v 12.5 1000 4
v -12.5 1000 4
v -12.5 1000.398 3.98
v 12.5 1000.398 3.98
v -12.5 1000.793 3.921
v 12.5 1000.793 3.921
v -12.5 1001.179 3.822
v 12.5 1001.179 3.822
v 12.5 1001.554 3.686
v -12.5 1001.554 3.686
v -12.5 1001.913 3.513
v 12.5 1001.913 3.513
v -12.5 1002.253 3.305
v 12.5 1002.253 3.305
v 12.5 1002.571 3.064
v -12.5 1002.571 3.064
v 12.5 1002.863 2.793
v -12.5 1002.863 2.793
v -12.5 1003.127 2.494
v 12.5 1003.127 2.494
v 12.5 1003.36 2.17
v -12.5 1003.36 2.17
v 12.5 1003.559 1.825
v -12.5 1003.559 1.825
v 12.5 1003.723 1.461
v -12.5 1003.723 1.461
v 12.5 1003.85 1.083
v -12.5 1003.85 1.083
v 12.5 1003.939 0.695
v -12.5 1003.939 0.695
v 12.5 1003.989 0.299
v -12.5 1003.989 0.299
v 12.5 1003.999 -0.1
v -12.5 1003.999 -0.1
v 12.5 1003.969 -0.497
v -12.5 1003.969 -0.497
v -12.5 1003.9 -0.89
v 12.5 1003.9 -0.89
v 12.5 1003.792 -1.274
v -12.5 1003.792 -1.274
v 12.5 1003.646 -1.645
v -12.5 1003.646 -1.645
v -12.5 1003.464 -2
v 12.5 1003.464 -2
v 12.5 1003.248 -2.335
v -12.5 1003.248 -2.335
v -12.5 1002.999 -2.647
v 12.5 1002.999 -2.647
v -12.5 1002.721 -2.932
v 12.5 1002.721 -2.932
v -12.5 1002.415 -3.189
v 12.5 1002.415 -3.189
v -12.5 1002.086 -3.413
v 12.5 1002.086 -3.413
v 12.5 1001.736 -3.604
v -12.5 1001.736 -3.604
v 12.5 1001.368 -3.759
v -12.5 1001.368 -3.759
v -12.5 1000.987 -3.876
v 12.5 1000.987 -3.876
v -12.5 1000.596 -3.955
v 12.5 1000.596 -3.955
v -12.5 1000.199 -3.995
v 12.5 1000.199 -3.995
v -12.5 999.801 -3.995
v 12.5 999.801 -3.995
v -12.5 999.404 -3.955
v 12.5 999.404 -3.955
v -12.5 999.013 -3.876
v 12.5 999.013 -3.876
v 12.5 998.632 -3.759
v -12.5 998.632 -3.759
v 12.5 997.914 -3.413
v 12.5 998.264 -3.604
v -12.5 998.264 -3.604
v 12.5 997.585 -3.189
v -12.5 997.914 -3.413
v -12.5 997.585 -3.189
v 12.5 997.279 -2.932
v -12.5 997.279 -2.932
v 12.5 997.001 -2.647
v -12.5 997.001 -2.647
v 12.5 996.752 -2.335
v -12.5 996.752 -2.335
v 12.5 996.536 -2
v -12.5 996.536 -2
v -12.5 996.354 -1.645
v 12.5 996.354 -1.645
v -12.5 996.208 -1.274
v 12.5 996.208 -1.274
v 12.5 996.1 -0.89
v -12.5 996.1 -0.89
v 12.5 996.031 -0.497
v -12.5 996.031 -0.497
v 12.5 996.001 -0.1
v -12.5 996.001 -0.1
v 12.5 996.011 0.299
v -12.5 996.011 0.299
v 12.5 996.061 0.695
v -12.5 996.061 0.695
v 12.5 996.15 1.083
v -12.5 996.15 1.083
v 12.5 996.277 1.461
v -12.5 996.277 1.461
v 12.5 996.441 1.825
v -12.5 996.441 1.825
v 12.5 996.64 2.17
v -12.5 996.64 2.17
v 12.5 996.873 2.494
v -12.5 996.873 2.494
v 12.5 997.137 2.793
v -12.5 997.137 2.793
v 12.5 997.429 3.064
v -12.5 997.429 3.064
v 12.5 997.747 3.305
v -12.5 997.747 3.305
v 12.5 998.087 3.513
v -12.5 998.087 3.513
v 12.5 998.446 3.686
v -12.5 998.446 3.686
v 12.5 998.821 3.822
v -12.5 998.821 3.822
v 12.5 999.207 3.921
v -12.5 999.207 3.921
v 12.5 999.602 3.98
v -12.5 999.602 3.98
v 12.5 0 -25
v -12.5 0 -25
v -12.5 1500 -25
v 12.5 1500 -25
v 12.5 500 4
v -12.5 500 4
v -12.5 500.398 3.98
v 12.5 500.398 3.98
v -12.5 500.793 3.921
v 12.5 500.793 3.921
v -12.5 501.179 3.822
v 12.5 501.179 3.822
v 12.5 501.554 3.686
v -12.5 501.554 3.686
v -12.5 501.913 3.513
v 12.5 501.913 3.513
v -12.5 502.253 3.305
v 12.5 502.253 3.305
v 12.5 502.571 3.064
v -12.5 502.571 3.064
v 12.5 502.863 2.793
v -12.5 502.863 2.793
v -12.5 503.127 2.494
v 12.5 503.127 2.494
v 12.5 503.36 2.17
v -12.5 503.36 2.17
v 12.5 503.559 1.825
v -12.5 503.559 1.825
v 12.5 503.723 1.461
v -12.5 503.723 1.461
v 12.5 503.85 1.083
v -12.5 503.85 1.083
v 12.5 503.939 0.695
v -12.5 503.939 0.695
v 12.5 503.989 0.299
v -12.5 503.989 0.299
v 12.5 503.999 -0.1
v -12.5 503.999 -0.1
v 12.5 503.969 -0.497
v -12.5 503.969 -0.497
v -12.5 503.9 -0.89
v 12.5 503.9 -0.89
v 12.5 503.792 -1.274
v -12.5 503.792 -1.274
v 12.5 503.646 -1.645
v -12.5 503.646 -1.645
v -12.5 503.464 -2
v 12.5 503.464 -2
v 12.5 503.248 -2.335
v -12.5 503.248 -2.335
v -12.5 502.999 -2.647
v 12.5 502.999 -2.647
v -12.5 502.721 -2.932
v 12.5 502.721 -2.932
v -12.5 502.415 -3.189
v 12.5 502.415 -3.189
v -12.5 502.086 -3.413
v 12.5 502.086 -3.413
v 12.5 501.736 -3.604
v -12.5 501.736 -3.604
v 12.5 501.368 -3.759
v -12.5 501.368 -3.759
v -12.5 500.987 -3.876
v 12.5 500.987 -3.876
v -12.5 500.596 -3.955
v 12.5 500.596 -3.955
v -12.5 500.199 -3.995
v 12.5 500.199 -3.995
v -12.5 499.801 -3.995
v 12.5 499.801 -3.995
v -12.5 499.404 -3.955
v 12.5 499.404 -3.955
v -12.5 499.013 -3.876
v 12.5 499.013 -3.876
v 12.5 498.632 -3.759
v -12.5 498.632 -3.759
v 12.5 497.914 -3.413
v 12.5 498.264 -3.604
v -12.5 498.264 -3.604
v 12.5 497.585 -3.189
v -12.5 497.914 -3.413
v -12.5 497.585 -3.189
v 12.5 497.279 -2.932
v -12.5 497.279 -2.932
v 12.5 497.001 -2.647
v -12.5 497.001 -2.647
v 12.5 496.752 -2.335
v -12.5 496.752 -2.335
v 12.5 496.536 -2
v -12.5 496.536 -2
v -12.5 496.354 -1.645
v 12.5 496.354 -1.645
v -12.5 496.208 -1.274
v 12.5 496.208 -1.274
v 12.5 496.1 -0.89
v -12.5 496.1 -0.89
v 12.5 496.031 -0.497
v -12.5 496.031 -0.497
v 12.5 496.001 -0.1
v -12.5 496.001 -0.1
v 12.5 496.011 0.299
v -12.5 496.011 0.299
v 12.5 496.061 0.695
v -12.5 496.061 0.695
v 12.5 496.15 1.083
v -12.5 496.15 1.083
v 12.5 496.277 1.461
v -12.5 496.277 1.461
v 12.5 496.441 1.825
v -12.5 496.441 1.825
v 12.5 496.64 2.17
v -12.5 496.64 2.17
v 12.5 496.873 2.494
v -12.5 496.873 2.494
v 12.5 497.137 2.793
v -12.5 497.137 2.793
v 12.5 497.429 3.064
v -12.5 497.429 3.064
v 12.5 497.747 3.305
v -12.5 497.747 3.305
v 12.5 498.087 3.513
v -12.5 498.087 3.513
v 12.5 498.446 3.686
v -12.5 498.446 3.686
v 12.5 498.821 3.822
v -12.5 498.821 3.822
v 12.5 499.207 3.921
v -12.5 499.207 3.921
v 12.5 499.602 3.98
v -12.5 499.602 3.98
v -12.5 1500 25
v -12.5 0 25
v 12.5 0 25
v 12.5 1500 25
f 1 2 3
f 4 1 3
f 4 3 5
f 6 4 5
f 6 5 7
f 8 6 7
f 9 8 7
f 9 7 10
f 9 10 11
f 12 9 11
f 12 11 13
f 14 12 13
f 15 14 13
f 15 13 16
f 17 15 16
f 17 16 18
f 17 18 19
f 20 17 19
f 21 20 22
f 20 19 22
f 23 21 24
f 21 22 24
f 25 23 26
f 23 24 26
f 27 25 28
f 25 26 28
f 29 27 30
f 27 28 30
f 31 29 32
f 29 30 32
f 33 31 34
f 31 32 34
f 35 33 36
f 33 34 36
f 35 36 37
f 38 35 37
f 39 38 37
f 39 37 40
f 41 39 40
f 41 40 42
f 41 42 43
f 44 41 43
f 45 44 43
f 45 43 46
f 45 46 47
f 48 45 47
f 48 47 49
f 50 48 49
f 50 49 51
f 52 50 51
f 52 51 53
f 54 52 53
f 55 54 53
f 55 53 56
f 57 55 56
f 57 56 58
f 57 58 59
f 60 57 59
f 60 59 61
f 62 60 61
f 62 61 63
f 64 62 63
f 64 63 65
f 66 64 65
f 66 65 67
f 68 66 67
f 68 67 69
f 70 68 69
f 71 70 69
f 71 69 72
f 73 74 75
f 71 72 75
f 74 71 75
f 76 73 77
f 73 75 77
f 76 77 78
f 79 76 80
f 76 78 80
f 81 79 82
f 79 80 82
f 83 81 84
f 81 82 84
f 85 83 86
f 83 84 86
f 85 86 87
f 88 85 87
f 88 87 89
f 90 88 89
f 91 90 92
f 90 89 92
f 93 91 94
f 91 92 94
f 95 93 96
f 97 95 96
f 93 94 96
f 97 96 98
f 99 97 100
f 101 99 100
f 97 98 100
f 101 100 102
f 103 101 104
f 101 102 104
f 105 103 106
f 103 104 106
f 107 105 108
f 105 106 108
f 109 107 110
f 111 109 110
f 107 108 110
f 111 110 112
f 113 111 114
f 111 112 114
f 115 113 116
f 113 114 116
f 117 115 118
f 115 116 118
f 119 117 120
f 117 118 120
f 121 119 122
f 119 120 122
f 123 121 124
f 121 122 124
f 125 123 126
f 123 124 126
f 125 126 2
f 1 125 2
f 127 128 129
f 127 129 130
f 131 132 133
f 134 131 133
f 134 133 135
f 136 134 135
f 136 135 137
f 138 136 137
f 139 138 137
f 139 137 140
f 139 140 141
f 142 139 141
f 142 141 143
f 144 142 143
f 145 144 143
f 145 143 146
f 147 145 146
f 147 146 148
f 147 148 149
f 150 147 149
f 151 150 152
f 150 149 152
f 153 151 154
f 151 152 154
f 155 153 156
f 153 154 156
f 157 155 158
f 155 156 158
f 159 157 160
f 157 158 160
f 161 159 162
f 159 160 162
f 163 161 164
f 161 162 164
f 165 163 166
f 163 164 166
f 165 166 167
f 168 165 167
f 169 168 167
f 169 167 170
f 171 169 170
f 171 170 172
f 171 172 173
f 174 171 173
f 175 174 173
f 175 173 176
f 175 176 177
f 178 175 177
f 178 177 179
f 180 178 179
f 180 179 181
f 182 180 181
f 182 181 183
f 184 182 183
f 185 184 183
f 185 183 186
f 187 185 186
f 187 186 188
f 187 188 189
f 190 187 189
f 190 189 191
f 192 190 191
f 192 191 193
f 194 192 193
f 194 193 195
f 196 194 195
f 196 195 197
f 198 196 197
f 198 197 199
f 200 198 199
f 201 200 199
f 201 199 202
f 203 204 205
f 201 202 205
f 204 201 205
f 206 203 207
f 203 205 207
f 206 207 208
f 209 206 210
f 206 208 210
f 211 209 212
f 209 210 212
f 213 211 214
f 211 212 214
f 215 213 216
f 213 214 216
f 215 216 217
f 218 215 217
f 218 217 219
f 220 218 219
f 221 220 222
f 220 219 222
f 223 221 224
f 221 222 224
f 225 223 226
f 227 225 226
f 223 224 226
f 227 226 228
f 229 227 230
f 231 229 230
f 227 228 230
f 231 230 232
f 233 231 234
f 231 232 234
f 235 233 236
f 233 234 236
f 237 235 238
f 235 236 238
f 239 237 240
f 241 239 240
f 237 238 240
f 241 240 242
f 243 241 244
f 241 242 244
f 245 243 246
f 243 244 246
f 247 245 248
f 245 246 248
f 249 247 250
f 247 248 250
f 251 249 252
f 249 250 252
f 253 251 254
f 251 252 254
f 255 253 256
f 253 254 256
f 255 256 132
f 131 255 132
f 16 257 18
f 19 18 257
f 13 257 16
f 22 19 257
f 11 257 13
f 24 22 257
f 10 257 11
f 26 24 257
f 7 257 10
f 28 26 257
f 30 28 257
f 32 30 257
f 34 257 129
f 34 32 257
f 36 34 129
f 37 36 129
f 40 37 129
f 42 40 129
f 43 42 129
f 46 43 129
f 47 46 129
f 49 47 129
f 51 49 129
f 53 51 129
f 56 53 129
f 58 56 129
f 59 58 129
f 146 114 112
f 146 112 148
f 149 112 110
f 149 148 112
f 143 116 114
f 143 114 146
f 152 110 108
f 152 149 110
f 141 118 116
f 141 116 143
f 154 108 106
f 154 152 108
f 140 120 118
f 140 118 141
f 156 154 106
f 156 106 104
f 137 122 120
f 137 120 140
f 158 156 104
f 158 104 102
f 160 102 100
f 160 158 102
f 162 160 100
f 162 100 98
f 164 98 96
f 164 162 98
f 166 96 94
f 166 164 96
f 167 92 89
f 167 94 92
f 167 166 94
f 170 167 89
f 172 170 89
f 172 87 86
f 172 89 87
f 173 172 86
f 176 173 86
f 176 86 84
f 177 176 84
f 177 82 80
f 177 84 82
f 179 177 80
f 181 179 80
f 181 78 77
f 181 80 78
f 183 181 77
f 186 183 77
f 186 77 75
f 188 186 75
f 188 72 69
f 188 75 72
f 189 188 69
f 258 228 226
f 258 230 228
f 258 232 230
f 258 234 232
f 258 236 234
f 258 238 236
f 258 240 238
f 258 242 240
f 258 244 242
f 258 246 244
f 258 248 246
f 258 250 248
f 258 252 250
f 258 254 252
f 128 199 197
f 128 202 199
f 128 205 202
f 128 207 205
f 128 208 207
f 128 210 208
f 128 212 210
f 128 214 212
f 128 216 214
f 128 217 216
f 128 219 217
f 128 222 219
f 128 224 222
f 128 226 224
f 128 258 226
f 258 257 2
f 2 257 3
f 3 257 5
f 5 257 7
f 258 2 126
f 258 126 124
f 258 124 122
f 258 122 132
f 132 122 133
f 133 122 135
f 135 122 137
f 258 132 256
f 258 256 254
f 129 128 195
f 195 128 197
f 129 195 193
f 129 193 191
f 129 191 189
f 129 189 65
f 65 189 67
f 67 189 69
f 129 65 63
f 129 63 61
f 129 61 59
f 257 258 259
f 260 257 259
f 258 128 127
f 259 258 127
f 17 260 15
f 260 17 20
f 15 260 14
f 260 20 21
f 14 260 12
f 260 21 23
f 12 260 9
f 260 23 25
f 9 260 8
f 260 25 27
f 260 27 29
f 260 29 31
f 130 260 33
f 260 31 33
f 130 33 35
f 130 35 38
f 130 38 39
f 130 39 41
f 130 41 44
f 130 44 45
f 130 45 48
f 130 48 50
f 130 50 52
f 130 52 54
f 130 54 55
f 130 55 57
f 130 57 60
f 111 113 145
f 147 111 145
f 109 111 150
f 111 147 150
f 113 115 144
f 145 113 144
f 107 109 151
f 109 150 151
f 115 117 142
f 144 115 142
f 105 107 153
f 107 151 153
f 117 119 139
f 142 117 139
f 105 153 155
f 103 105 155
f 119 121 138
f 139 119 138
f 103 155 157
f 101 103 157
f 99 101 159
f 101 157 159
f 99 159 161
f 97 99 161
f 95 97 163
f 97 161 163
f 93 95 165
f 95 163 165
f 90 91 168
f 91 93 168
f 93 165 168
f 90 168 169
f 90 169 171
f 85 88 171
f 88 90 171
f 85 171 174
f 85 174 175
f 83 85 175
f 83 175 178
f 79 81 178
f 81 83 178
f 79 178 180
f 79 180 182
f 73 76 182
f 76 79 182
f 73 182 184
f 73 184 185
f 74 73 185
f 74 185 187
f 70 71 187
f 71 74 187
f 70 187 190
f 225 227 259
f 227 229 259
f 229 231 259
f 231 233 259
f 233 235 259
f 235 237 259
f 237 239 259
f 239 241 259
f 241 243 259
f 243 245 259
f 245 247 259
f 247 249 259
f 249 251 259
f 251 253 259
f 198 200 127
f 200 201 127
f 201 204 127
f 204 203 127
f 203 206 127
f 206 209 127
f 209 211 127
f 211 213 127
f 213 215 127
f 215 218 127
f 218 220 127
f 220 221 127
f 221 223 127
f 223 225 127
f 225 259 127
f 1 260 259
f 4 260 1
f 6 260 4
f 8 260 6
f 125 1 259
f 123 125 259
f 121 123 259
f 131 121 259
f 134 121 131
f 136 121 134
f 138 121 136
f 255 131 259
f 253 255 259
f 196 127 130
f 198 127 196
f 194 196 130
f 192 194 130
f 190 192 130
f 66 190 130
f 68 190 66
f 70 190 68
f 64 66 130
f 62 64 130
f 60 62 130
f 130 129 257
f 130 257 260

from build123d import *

# Parameters (mm, degrees)
SKETCH_1_W          = 25
SKETCH_1_H          = 50
EXTRUDE_1_DEPTH     = 1500
SKETCH_2_R          = 4
CUT_EXTRUDE_1_DEPTH = 1500


with BuildPart() as part:
    # Эскиз1 → Бобышка-Вытянуть1 (new body)
    with BuildSketch(Plane(origin=(0, 0, 0), x_dir=(1, 0, 0), z_dir=(0, 1, 0))):
        Rectangle(SKETCH_1_W, SKETCH_1_H)
    extrude(amount=EXTRUDE_1_DEPTH)

    # Эскиз2 → Вырез-Вытянуть1 (cut)
    with BuildSketch(Plane.ZY.offset(12.5)):
        with Locations((0, 1000)):
            Circle(SKETCH_2_R)
        with Locations((0, 500)):
            Circle(SKETCH_2_R)
    extrude(amount=-CUT_EXTRUDE_1_DEPTH, mode=Mode.SUBTRACT)


solid = part.part
